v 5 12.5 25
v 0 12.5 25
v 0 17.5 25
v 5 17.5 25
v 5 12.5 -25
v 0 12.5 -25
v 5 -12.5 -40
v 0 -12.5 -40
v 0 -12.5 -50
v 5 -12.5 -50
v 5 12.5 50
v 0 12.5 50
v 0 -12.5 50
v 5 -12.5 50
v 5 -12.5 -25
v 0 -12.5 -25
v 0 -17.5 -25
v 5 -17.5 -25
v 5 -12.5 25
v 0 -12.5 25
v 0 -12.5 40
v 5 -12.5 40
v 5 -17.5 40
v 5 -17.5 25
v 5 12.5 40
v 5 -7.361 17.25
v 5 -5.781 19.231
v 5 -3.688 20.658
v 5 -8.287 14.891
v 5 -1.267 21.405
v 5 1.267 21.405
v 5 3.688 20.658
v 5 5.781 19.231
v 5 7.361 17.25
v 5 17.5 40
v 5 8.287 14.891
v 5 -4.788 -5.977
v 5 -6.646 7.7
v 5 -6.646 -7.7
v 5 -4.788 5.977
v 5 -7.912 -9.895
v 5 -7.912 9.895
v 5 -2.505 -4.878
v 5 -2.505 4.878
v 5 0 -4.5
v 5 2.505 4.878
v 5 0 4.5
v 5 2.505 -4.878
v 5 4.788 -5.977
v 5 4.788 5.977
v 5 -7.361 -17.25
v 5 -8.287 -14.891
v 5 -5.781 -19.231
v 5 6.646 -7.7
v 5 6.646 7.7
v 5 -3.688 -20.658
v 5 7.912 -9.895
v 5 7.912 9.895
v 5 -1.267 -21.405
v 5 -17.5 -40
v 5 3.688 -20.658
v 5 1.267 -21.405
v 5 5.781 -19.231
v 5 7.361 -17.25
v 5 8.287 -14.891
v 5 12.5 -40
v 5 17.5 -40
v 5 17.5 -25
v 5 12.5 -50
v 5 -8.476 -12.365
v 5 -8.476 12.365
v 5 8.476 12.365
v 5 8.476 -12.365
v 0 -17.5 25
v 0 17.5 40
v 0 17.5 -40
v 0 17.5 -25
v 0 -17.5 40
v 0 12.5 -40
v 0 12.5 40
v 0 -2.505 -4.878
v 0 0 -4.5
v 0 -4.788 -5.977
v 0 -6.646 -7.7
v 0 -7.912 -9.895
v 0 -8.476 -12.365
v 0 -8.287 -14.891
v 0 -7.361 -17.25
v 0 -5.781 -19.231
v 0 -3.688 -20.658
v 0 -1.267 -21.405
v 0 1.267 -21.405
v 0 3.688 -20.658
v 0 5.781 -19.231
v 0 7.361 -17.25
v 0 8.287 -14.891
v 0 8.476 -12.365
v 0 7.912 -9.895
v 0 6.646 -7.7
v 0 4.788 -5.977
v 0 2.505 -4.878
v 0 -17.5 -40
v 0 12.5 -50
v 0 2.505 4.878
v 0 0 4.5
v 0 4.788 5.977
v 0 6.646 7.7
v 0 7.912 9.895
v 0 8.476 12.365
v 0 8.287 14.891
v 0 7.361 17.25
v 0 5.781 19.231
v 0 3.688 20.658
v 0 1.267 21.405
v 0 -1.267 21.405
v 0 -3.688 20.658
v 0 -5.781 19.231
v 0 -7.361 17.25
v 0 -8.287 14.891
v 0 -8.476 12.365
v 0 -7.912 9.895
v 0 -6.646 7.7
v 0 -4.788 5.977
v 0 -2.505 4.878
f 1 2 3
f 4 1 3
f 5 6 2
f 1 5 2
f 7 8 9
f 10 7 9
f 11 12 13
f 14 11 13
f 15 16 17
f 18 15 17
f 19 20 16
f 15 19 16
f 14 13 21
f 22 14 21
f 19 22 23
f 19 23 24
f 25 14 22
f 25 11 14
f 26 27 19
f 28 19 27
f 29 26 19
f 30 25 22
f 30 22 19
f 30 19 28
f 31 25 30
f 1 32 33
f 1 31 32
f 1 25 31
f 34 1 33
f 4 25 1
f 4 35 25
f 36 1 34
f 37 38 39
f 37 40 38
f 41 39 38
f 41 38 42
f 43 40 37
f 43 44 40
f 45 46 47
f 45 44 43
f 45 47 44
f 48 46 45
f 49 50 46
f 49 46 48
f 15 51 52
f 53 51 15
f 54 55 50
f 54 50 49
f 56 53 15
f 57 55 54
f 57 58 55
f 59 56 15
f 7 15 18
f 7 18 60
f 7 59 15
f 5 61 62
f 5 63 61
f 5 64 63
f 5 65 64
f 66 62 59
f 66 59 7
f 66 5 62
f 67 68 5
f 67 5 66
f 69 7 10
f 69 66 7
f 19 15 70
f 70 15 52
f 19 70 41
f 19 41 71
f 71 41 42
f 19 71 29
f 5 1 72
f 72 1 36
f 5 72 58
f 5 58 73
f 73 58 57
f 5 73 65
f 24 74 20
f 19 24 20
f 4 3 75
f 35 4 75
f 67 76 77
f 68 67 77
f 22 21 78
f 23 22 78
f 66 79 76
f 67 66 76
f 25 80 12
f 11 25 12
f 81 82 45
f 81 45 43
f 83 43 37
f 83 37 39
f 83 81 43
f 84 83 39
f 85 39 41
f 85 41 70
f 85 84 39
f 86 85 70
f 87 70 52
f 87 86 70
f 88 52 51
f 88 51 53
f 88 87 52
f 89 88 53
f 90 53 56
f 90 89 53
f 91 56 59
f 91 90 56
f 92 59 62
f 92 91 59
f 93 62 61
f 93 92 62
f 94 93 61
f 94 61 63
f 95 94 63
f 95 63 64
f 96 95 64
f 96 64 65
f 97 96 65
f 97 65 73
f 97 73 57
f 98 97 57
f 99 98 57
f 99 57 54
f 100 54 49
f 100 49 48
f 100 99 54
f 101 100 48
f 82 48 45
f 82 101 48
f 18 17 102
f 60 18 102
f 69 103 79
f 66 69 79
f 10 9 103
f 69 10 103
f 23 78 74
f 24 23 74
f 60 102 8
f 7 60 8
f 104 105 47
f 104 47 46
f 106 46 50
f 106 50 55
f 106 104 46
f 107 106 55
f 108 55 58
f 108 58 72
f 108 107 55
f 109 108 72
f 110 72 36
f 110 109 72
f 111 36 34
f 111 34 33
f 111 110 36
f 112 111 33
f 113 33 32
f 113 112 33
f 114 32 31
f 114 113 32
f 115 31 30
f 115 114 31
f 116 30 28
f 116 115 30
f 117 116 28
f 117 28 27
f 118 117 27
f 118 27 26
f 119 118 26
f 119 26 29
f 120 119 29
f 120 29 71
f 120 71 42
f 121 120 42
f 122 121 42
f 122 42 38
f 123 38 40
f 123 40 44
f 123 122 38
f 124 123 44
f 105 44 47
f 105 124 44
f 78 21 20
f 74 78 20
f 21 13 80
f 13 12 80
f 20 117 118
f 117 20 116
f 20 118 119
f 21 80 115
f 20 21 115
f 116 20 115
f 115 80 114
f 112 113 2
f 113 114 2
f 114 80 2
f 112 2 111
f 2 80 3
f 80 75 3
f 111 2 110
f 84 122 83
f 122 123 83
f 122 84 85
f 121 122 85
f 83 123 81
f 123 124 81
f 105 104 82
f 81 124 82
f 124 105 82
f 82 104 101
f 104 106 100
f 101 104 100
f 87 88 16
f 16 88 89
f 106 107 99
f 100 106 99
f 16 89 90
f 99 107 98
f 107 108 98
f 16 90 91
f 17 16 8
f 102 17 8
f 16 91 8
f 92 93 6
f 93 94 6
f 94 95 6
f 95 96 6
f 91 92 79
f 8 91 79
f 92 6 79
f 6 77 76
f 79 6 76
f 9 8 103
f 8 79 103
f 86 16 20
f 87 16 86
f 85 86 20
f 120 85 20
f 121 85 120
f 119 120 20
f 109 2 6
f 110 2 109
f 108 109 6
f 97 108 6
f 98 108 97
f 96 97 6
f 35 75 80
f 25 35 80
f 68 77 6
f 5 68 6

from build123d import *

# Parameters (mm, degrees)
SKETCH2_R           = 8.5
BOSS_EXTRUDE1_DEPTH = 5


with BuildPart() as part:
    # Sketch2 → Boss-Extrude1 (new body)
    with BuildSketch(Plane(origin=(0, 0, 0), x_dir=(0, 0, -1), z_dir=(1, 0, 0))):
        Polygon((-50, -12.5), (-40, -12.5), (-40, -17.5), (-25, -17.5), (-25, -12.5), (25, -12.5), (25, -17.5), (40, -17.5), (40, -12.5), (50, -12.5), (50, 12.5), (40, 12.5), (40, 17.5), (25, 17.5), (25, 12.5), (-25, 12.5), (-25, 17.5), (-40, 17.5), (-40, 12.5), (-50, 12.5), align=None)
        with Locations((-13, 0)):
            Circle(SKETCH2_R, mode=Mode.SUBTRACT)
        with Locations(Location((13, 0, 0), (0, 0, 180))):
            Circle(SKETCH2_R, mode=Mode.SUBTRACT)
    extrude(amount=BOSS_EXTRUDE1_DEPTH)


solid = part.part
